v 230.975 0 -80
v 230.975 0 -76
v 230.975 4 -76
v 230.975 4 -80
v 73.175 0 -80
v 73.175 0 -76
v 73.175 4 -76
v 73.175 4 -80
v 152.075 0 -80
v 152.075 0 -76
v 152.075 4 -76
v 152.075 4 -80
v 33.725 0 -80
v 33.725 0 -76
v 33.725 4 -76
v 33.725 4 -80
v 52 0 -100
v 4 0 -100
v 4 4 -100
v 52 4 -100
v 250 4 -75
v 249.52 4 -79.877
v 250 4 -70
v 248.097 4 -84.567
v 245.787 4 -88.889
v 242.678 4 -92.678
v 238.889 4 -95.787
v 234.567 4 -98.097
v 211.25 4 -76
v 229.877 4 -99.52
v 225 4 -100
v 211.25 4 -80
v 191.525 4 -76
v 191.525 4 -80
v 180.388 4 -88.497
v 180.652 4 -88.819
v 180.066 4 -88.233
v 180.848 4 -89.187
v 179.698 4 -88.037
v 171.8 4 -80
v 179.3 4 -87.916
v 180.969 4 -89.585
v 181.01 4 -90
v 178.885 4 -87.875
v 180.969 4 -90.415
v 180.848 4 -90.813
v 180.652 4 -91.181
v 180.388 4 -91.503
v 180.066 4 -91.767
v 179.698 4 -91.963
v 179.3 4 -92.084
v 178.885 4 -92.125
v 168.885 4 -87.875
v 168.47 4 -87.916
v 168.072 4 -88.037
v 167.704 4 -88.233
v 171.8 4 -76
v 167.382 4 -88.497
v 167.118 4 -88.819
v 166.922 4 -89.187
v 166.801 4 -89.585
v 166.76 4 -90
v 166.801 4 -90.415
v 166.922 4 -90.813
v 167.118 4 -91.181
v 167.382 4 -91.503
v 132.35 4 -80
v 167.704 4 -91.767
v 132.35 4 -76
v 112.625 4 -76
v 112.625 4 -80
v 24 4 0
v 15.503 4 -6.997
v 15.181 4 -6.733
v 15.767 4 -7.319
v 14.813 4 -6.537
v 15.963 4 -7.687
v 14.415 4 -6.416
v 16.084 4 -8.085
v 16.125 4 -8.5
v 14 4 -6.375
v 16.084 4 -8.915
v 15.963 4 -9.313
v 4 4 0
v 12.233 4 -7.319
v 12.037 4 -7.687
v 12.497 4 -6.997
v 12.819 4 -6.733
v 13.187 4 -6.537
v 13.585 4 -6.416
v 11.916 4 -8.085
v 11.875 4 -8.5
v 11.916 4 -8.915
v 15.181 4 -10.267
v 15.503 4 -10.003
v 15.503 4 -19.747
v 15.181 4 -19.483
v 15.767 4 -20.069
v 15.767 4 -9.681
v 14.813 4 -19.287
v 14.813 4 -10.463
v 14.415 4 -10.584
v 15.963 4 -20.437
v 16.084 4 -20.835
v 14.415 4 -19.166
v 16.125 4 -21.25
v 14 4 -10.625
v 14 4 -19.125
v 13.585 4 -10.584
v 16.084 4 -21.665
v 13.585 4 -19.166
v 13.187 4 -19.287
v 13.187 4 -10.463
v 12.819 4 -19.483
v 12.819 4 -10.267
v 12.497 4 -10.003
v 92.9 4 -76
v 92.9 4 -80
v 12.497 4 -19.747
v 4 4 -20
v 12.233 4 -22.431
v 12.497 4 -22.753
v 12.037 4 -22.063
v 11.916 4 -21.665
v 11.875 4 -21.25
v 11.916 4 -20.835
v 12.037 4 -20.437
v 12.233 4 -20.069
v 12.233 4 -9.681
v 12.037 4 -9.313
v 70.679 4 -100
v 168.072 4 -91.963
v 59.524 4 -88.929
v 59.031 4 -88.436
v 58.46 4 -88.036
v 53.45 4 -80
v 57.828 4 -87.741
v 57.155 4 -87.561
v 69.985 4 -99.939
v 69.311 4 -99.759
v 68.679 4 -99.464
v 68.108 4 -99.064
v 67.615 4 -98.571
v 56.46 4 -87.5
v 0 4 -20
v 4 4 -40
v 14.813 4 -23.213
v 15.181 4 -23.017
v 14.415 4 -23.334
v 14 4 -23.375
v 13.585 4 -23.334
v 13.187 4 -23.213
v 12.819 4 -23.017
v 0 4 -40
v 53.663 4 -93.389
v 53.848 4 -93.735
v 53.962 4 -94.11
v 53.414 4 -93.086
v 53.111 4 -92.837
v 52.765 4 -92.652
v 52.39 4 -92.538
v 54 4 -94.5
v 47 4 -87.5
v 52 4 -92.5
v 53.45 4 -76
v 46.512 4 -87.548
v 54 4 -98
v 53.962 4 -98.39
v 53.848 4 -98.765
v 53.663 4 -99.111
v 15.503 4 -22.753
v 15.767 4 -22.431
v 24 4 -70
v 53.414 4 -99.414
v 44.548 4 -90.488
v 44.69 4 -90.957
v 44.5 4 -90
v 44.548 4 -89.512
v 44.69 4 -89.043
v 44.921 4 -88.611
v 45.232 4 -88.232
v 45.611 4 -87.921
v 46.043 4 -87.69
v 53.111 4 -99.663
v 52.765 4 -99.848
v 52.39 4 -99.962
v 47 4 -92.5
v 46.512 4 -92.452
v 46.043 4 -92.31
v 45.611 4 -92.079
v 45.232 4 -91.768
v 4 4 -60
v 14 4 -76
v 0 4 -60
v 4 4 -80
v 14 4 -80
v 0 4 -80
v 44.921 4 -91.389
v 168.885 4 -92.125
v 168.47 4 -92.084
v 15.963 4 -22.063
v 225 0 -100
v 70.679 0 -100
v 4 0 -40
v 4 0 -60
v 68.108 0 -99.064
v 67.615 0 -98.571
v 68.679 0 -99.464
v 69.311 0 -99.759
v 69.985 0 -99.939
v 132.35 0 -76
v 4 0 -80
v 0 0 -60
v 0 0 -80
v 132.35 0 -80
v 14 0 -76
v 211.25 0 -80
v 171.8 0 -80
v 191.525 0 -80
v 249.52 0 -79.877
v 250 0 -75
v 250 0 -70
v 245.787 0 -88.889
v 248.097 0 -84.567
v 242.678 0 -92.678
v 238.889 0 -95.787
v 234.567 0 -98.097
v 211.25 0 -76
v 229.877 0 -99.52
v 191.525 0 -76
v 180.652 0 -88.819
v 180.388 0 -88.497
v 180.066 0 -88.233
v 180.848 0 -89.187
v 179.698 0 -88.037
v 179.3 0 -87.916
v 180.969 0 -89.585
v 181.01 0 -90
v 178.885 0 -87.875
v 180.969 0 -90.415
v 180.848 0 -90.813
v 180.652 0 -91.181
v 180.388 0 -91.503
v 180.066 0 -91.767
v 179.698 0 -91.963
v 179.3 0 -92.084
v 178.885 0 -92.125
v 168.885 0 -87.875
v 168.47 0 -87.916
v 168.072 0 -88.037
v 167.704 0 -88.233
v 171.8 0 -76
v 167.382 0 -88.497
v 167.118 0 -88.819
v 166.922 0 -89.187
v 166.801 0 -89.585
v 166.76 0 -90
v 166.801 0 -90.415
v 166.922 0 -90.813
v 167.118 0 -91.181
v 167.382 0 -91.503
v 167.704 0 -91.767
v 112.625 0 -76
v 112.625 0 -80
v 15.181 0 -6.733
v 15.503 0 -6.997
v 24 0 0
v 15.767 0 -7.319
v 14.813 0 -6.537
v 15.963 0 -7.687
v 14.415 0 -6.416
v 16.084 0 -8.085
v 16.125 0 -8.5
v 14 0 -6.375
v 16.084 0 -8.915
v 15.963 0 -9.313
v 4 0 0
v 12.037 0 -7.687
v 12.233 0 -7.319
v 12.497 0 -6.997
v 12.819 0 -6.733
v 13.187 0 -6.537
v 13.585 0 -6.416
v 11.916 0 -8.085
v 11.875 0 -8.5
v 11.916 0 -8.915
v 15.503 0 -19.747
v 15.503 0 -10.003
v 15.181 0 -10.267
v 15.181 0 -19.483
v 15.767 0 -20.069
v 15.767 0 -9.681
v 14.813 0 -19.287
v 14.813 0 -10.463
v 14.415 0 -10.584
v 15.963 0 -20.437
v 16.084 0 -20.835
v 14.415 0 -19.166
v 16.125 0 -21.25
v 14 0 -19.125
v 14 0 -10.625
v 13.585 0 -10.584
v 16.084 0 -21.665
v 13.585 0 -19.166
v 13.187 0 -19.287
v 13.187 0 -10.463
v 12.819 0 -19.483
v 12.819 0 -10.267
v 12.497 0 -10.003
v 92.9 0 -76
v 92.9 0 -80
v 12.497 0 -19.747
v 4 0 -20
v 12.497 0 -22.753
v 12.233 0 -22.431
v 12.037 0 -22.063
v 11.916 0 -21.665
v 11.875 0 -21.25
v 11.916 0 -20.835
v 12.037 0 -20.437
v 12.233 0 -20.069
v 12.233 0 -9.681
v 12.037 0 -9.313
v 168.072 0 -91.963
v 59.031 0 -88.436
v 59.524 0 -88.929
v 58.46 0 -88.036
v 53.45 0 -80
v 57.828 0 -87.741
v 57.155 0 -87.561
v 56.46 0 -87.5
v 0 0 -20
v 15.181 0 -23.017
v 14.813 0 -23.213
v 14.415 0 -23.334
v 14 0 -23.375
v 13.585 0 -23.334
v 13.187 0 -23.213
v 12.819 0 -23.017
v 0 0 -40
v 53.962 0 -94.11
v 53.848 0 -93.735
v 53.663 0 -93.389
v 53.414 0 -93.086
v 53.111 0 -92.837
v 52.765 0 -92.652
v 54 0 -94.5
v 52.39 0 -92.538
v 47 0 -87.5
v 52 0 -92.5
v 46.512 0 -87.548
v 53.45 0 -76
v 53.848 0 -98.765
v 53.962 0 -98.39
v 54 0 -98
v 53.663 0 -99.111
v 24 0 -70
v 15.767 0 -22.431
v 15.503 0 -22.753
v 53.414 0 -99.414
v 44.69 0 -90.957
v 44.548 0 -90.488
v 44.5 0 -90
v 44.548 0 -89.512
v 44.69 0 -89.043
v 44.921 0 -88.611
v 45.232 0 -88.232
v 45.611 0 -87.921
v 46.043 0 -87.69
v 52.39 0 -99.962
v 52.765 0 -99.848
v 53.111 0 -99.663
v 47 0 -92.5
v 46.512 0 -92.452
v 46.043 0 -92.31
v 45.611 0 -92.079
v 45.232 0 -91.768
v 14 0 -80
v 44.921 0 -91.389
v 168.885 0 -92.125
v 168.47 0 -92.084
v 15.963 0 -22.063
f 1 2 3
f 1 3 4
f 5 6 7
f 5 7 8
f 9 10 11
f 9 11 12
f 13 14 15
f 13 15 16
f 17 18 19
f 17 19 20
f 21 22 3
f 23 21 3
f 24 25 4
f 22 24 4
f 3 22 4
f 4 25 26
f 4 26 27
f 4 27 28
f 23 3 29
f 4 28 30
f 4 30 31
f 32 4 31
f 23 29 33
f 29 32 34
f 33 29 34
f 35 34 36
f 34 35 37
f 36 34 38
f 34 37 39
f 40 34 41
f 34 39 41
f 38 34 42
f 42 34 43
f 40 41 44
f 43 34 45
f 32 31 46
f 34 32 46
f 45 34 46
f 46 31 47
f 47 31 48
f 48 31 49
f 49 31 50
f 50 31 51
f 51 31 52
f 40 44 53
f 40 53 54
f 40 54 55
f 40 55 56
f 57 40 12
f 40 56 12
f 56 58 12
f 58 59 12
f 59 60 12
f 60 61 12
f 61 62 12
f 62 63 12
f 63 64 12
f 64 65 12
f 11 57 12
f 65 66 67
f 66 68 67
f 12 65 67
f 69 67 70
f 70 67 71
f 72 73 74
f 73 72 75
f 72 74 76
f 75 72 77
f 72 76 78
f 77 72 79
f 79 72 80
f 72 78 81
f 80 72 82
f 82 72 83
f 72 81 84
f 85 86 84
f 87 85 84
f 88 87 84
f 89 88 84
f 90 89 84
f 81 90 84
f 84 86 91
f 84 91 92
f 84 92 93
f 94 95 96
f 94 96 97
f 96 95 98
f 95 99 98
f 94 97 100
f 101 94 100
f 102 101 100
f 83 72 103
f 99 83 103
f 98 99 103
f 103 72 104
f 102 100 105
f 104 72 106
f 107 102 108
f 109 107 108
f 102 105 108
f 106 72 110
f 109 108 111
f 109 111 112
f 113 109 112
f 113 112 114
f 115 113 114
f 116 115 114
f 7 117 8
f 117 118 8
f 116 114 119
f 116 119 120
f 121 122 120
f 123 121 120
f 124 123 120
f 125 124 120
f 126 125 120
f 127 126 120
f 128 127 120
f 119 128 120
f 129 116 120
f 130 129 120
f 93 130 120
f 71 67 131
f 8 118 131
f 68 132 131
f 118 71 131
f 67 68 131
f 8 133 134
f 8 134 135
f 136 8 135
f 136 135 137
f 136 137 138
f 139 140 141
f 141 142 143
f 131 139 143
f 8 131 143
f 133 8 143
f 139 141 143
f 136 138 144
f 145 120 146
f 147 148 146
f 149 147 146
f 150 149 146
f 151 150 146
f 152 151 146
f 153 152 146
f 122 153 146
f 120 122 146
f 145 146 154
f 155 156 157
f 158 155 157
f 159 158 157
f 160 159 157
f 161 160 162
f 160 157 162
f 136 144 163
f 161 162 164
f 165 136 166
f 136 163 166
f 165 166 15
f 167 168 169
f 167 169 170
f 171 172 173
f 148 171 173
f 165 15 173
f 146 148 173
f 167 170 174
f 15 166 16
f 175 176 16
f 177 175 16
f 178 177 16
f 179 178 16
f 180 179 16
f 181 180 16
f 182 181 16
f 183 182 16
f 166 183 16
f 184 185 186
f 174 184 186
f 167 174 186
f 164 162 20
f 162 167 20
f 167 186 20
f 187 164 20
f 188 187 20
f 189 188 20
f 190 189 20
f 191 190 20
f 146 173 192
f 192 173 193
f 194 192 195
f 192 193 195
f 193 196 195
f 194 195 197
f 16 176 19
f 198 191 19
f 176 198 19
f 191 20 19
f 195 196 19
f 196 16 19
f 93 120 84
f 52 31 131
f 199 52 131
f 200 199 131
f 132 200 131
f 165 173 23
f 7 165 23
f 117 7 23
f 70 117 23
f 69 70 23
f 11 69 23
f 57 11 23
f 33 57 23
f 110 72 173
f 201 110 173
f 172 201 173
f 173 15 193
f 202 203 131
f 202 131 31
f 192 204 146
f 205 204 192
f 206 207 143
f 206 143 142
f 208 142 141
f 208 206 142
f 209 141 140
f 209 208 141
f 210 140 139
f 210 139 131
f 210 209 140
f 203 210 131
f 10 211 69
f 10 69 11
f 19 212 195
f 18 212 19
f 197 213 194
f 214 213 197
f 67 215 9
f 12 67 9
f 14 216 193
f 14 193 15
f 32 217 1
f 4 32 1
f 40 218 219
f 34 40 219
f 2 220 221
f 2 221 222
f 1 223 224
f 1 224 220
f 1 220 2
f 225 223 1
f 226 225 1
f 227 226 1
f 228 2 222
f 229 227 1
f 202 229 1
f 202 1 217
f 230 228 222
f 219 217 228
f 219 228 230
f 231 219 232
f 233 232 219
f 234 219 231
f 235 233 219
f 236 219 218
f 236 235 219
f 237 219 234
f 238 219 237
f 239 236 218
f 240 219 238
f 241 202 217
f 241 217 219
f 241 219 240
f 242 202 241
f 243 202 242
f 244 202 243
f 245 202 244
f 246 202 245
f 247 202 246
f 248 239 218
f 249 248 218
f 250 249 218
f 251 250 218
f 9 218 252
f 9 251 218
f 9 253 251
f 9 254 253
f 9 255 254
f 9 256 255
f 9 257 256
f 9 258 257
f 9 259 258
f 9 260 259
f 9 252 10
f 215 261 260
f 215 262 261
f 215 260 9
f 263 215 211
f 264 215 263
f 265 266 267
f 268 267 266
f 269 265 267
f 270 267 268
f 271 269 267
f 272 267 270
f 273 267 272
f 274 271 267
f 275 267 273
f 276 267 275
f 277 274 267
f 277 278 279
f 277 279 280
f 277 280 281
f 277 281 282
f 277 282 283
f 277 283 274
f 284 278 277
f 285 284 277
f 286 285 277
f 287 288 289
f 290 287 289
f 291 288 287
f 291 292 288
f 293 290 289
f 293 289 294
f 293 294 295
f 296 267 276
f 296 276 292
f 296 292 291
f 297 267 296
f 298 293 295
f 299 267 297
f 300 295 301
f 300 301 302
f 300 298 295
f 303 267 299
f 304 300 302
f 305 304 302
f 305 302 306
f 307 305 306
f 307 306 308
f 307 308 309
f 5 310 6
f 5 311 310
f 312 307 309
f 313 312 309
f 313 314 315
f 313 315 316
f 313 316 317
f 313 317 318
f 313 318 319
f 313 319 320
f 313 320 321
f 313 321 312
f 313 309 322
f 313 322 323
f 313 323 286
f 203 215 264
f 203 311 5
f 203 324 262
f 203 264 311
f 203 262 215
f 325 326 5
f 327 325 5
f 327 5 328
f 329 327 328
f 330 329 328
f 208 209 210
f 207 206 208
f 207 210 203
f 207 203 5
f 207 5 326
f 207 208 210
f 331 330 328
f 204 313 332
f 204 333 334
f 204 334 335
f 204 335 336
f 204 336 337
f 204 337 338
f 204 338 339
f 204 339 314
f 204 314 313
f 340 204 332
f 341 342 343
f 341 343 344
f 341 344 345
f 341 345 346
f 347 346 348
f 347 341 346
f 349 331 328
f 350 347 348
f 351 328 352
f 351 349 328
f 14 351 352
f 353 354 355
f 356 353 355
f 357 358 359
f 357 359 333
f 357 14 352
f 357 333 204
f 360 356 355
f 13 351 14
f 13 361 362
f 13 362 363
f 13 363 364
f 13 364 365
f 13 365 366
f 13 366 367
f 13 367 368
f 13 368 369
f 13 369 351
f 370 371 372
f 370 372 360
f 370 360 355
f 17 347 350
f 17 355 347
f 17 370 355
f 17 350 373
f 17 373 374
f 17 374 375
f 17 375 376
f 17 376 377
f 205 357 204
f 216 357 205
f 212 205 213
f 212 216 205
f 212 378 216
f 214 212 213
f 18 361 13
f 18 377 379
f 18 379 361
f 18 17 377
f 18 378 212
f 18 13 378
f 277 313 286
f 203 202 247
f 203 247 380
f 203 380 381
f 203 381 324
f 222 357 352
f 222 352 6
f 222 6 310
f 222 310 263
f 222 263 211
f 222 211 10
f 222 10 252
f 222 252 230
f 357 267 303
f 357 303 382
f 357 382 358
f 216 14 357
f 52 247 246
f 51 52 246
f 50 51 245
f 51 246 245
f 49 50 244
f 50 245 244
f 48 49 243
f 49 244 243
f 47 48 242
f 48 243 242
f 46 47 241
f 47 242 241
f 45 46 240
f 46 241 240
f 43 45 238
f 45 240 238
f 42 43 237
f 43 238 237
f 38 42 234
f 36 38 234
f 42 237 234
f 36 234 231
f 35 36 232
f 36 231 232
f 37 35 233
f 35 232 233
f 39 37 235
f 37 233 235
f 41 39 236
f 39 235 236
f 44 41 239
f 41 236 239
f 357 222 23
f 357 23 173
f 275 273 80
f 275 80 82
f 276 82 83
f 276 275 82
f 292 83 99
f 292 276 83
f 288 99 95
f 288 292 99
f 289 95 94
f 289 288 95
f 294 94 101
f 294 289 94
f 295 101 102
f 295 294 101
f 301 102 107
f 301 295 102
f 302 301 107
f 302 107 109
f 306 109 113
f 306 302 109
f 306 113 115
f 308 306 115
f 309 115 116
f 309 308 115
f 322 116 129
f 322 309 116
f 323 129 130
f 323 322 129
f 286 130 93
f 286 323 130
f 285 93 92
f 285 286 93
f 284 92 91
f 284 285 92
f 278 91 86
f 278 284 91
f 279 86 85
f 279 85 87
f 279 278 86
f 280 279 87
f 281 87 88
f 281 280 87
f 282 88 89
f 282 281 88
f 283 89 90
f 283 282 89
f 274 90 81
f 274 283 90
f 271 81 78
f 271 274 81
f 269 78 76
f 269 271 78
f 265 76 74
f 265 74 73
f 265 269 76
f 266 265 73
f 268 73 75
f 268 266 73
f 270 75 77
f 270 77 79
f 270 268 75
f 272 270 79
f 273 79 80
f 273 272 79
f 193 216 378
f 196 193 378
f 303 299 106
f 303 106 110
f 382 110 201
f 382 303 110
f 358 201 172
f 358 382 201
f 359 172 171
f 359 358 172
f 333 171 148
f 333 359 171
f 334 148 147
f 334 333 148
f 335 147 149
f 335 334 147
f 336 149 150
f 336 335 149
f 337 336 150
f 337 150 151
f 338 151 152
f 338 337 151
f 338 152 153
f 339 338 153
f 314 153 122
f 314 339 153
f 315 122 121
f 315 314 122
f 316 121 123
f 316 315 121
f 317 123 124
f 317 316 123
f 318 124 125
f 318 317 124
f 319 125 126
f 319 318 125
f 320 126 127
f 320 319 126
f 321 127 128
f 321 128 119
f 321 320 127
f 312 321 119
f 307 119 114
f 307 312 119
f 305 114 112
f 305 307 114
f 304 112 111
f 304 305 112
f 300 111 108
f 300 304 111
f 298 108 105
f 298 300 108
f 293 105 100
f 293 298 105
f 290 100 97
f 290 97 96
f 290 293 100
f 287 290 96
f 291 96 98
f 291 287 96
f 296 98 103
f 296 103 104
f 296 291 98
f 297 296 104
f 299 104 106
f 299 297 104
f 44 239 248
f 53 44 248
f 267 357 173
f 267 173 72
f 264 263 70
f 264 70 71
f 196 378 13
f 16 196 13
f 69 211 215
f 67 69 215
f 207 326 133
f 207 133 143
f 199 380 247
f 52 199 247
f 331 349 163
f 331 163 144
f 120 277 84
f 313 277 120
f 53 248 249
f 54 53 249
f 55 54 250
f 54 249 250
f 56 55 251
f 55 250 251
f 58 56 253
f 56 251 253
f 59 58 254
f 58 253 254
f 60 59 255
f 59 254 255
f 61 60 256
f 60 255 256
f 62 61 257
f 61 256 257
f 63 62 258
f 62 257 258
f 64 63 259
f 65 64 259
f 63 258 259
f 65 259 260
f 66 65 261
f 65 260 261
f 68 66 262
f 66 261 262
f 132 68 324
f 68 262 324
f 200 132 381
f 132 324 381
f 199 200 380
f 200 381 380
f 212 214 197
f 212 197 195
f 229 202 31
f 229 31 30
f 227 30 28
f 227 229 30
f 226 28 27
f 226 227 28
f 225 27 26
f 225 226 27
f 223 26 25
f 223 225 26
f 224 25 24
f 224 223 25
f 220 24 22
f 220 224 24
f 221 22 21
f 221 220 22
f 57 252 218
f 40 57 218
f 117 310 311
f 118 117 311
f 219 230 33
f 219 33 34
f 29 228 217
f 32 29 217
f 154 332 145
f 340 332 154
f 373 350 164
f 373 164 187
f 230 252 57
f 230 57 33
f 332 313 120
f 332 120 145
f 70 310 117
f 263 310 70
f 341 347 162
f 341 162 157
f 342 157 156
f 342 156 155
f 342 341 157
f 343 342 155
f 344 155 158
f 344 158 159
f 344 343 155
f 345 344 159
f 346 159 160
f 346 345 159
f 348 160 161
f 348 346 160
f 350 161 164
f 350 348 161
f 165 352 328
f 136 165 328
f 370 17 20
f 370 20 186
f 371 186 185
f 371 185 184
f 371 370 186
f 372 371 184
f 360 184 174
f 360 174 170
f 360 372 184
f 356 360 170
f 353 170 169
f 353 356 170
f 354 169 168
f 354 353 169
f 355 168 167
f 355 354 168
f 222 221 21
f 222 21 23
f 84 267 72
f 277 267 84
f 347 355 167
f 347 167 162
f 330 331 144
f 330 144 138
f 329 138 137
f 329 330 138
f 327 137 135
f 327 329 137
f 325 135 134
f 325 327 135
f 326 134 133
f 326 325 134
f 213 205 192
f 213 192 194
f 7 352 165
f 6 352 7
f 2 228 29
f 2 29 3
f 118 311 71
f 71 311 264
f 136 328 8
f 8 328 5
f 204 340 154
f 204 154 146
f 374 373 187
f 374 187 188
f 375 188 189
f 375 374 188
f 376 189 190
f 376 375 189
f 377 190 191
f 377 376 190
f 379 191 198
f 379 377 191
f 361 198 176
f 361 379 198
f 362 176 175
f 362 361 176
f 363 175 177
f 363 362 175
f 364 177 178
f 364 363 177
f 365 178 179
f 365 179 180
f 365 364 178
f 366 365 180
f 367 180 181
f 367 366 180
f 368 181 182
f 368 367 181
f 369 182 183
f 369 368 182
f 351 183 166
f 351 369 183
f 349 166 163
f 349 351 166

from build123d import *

# Parameters (mm, degrees)
SKETCH1_R           = 2.125
SKETCH1_W           = 19.725
SKETCH1_H           = 4
BOSS_EXTRUDE1_DEPTH = 4


with BuildPart() as part:
    # Sketch1 → Boss-Extrude1 (new body)
    with BuildSketch(Plane(origin=(0, 0, 0), x_dir=(1, 0, 0), z_dir=(0, 1, 0))):
        with BuildLine():
            Line((4, 0), (4, 20))
            Line((4, 20), (0, 20))
            Line((0, 20), (0, 40))
            Line((0, 40), (4, 40))
            Line((4, 40), (4, 60))
            Line((4, 60), (0, 60))
            Line((0, 60), (0, 80))
            Line((0, 80), (4, 80))
            Line((4, 80), (4, 100))
            Line((4, 100), (52, 100))
            ThreePointArc((52, 100), (53.414213562, 99.414213562), (54, 98))
            Line((54, 98), (54, 94.5))
            ThreePointArc((54, 94.5), (53.414213562, 93.085786438), (52, 92.5))
            Line((52, 92.5), (47, 92.5))
            ThreePointArc((47, 92.5), (44.5, 90), (47, 87.5))
            Line((47, 87.5), (56.460109826, 87.5))
            ThreePointArc((56.460109826, 87.5), (58.150582873, 87.874768852), (59.524287598, 88.928849561))
            Line((59.524287598, 88.928849561), (67.615138708, 98.571150439))
            ThreePointArc((67.615138708, 98.571150439), (68.988843434, 99.625231148), (70.679316481, 100))
            Line((70.679316481, 100), (225, 100))
            ThreePointArc((225, 100), (242.67766953, 92.67766953), (250, 75))
            Line((250, 75), (250, 70))
            Line((250, 70), (24, 70))
            Line((24, 70), (24, 0))
            Line((24, 0), (4, 0))
        make_face()
        with Locations((14, 8.5)):
            Circle(SKETCH1_R, mode=Mode.SUBTRACT)
        with Locations((14, 21.25)):
            Circle(SKETCH1_R, mode=Mode.SUBTRACT)
        with Locations((63.3125, 78)):
            Rectangle(SKETCH1_W, SKETCH1_H, mode=Mode.SUBTRACT)
        with Locations((23.8625, 78)):
            Rectangle(SKETCH1_W, SKETCH1_H, mode=Mode.SUBTRACT)
        with Locations((102.7625, 78)):
            Rectangle(SKETCH1_W, SKETCH1_H, mode=Mode.SUBTRACT)
        with Locations((142.2125, 78)):
            Rectangle(SKETCH1_W, SKETCH1_H, mode=Mode.SUBTRACT)
        with Locations((181.6625, 78)):
            Rectangle(SKETCH1_W, SKETCH1_H, mode=Mode.SUBTRACT)
        with Locations((221.1125, 78)):
            Rectangle(SKETCH1_W, SKETCH1_H, mode=Mode.SUBTRACT)
        with BuildLine():
            Line((168.885, 92.125), (178.885, 92.125))
            ThreePointArc((178.885, 92.125), (181.01, 90), (178.885, 87.875))
            Line((178.885, 87.875), (168.885, 87.875))
            ThreePointArc((168.885, 87.875), (166.76, 90), (168.885, 92.125))
        make_face(mode=Mode.SUBTRACT)
    extrude(amount=BOSS_EXTRUDE1_DEPTH)


solid = part.part
